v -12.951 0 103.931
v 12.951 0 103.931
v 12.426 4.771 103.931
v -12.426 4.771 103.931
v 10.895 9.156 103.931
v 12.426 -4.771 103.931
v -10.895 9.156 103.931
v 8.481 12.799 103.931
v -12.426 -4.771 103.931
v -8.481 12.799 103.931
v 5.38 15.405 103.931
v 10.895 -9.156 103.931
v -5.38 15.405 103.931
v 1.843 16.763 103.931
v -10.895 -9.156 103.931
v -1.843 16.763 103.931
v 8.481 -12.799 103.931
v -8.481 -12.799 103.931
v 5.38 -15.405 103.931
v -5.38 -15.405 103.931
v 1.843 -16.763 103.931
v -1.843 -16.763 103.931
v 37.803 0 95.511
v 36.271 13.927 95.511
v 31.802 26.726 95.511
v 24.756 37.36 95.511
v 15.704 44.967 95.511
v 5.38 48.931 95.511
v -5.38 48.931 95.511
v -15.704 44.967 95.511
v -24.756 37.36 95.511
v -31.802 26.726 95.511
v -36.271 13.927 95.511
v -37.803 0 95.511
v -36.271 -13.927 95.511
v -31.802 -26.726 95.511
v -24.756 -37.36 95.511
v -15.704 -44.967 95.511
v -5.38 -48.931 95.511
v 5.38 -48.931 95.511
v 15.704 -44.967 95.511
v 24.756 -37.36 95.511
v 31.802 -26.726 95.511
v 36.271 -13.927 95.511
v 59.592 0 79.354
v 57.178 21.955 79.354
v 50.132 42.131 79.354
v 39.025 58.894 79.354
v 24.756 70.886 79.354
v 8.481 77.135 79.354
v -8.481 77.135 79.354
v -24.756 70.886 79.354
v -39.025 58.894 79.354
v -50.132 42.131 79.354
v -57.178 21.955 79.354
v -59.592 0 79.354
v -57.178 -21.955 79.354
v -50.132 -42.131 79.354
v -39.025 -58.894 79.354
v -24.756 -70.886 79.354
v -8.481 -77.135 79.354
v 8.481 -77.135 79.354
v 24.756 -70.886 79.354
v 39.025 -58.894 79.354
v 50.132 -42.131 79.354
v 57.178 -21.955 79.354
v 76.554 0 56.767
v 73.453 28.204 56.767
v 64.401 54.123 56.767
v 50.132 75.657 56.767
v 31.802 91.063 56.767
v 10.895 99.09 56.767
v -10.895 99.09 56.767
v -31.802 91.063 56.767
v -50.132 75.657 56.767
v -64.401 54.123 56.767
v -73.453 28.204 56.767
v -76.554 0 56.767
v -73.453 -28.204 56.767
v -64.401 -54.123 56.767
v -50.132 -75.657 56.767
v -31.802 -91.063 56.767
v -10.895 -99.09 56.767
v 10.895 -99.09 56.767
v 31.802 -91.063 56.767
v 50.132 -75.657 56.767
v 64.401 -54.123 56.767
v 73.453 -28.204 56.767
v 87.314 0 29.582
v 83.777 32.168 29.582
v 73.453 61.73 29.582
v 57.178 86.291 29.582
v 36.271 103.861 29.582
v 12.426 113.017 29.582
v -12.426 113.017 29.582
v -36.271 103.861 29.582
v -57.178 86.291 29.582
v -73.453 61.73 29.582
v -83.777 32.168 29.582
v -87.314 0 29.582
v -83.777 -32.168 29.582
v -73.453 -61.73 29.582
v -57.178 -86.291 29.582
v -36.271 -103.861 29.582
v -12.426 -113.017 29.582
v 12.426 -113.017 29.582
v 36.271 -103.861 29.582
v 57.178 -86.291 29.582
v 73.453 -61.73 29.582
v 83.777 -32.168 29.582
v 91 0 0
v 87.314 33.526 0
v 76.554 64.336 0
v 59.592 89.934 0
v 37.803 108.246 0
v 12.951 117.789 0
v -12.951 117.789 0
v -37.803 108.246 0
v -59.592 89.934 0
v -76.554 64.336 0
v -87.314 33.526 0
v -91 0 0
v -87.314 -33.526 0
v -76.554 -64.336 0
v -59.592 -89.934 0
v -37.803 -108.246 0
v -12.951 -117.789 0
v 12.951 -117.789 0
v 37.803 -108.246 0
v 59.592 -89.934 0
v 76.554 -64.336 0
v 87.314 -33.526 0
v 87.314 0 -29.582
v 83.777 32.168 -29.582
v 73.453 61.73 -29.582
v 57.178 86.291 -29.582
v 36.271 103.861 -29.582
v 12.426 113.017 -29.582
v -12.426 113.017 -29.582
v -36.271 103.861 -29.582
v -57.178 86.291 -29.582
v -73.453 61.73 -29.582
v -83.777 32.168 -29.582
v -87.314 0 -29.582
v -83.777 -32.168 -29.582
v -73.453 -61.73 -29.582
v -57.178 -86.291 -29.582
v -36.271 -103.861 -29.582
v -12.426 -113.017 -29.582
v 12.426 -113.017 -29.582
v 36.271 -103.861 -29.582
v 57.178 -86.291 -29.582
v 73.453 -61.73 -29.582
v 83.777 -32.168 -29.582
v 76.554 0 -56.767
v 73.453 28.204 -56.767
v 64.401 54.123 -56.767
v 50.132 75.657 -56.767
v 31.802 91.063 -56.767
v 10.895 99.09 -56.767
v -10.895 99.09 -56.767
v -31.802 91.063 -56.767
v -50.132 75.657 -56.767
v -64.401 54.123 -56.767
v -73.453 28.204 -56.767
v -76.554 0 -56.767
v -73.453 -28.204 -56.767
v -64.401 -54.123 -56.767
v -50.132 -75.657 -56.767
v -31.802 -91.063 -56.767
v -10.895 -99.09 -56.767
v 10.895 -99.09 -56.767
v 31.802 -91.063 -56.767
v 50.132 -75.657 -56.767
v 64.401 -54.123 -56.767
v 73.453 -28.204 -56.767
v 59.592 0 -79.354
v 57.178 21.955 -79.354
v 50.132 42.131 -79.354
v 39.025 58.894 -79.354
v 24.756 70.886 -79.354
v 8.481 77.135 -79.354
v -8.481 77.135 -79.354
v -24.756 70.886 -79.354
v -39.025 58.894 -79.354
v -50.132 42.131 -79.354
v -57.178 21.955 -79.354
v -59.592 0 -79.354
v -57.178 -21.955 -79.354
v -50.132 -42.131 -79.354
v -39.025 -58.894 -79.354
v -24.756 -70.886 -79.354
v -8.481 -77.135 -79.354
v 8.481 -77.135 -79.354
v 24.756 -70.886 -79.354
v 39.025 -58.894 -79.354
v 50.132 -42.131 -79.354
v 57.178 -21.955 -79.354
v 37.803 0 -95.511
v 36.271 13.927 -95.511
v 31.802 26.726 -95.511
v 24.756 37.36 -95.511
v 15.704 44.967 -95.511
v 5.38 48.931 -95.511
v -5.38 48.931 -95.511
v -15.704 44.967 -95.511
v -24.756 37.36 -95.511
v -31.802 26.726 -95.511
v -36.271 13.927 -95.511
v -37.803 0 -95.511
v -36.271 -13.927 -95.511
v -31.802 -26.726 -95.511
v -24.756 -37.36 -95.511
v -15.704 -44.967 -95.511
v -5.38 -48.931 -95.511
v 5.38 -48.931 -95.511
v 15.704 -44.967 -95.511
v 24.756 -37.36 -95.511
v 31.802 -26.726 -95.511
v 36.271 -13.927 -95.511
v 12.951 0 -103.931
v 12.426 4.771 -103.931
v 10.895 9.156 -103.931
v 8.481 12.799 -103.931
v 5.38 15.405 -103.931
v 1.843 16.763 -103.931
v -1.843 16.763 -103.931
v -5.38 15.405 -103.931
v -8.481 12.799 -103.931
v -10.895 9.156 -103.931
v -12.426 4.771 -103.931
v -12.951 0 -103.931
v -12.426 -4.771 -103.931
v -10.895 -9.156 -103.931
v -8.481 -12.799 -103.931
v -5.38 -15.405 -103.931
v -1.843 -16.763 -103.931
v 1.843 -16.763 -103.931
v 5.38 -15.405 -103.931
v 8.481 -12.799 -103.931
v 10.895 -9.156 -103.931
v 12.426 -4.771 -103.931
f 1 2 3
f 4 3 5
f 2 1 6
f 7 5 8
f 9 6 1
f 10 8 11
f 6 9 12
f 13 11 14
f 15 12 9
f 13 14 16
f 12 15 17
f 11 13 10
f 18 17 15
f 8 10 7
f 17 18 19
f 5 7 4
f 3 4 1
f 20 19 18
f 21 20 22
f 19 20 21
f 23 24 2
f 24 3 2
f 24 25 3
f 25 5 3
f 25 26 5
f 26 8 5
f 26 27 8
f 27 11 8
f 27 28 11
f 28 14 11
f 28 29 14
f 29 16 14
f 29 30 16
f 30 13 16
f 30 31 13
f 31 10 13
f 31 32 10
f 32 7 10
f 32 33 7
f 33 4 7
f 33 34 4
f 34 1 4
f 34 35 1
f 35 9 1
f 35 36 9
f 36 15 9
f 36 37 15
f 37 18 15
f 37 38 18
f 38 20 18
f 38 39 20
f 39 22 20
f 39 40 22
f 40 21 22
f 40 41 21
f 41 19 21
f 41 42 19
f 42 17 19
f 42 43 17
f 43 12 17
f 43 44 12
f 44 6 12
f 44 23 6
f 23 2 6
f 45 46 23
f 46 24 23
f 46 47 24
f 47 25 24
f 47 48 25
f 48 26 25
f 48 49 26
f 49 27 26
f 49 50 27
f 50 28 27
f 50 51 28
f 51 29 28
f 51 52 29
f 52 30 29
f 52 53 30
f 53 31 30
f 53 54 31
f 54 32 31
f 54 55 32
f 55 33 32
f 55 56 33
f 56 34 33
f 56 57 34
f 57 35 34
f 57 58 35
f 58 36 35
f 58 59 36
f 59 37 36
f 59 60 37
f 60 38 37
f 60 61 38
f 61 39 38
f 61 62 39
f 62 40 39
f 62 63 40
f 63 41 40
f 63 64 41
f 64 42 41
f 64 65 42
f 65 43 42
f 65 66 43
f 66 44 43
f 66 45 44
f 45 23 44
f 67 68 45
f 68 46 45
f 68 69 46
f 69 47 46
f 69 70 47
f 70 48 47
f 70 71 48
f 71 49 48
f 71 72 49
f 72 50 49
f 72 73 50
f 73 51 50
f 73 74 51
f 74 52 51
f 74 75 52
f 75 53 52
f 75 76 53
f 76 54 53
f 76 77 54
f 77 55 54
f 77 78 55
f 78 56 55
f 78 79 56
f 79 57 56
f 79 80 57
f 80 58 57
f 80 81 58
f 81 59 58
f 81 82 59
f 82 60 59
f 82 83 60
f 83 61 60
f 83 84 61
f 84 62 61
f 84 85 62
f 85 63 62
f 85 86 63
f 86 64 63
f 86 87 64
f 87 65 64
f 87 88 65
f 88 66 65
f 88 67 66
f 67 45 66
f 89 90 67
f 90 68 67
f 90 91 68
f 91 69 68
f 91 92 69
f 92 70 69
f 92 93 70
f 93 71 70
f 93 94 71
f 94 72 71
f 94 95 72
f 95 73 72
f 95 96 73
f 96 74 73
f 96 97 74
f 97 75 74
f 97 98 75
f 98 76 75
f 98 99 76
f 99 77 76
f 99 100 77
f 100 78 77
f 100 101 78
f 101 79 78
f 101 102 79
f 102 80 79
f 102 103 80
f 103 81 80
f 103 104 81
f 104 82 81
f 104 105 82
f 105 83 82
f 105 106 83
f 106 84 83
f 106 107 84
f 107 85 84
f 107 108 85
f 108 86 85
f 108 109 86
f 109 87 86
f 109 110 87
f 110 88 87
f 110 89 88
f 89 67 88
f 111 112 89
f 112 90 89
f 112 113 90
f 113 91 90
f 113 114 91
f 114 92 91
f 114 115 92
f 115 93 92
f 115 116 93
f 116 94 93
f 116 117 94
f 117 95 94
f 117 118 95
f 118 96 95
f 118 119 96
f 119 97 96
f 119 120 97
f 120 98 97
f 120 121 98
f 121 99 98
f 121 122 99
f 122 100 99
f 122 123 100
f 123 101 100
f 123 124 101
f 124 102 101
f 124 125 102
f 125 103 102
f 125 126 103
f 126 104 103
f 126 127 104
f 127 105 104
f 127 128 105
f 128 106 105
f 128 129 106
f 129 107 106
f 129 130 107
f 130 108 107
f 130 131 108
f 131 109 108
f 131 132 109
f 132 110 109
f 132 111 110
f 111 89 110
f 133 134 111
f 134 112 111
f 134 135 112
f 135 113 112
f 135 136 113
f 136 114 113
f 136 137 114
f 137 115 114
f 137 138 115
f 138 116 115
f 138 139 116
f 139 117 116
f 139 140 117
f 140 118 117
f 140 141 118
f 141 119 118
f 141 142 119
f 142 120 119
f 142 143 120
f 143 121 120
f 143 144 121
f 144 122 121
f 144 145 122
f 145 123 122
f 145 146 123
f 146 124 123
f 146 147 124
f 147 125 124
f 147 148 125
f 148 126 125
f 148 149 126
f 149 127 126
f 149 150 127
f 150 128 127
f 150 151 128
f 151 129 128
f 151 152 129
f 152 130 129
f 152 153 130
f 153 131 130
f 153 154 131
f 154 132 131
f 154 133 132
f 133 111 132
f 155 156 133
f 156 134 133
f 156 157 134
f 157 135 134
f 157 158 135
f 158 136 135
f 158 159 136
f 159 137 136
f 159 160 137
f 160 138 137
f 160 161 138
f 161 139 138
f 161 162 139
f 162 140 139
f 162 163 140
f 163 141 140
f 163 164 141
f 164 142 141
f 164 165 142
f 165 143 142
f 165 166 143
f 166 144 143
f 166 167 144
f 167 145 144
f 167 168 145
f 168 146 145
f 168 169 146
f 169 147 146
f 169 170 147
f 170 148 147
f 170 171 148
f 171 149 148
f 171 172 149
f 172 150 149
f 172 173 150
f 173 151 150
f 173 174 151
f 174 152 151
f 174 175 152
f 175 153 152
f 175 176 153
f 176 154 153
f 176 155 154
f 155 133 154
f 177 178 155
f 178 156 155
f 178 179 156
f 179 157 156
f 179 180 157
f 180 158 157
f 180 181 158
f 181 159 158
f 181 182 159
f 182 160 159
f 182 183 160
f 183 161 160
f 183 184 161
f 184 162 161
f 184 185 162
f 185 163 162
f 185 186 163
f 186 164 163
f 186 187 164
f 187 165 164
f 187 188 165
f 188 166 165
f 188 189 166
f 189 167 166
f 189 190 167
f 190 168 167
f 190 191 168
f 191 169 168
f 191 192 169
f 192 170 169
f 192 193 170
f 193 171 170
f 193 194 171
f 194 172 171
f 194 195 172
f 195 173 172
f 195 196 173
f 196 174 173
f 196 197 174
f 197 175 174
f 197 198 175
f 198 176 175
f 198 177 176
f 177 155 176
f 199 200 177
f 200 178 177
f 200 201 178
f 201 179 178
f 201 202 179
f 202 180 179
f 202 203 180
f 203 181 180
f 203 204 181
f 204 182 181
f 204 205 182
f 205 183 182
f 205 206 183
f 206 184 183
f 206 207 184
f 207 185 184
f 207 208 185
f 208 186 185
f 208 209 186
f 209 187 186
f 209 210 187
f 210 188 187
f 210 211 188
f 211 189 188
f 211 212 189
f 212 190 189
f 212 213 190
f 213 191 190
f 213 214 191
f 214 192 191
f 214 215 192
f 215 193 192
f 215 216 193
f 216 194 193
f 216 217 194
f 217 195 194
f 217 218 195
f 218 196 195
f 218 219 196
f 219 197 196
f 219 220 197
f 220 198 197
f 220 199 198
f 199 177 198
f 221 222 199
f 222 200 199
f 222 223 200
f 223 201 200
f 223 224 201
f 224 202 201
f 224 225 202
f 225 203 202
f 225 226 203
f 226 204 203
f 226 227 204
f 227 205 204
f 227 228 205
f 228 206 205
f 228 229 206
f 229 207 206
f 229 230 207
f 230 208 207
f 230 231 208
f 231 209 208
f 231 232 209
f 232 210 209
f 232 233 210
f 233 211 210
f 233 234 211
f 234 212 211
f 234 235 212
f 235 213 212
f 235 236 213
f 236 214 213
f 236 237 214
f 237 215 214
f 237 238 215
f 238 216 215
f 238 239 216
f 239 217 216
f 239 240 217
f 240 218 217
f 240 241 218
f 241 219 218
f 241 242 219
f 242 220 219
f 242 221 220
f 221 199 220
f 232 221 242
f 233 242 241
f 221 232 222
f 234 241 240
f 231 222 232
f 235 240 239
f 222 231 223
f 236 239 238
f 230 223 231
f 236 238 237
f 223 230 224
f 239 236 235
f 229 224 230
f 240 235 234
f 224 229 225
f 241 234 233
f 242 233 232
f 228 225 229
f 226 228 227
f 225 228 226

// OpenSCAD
// Generated by SolidPython 1.0.1 on 2020-07-29 00:46:51


scale(v = [13, 17, 15]) {
	sphere(r = 7);
}
/***********************************************
*********      SolidPython code:      **********
************************************************
 
# import packages: SolidPython
from solid import *
from solid.utils import *
from itertools import chain, combinations, permutations


class Resize:

    def __init__(self, scad_file):
        self.scad_file = scad_file
        #self.scad_file = import_scad(scad_file)
        # cone/cylinder param:
        self.r1 = 0
        self.r2 = 0
        self.h = 0
        # rectangular prism param:
        self.w = 0
        self.l = 0
        # ellipse param:
        self.r = 0

    # import OpenScad code (file name corresponds to shape)


    # classify shape + parameters
    def assign(self, param1, param2, param3):
        if self.scad_file == 'cone.scad':
            self.r1 = param1
            self.r2 = param2
            self.h = param3
        elif self.scad_file == 'cylinder.scad':
            self.r1 = param1
            self.r2 = param2
            self.h = param3
        elif self.scad_file == 'rectangularPrism.scad':
            self.h = param1
            self.l = param2
            self.w = param3
        else:
            self.r = param1
            self.h = param2

    # resize parameters
    def iterate(self):
        x = range(3, 20, 2)
        i = 1
        if self.scad_file == 'cone.scad':
            tempList = list(permutations(x, 2))
            for temp in tempList:
                param1 = temp[0]
                param2 = temp[1]
                filepath = 'produced_scad_files/' + 'cone' + str(param1) + '_' + str(param2) + '_' + '.scad'
                scad_render_to_file(cylinder(h=param1, r1=param2, r2=0), filepath)

        elif self.scad_file == 'cylinder.scad':
            tempList = list(permutations(x, 3))
            for temp in tempList:
                param1 = temp[0]
                param2 = temp[1]
                filepath = 'produced_scad_files/' + 'cylinder' + str(param1) + '_' + str(param2) + '_' + '.scad'
                scad_render_to_file(cylinder(h=param1, r1=param2, r2=param2), filepath)

        elif self.scad_file == 'rectangularPrism.scad':
            tempList = list(permutations(x, 3))
            for temp in tempList:
                param1 = temp[0]
                param2 = temp[1]
                param3 = temp[2]
                filepath = 'produced_scad_files/' + 'rectangularPrism' + str(param1) + '_' + str(param2) + '_' + str(
                    param3) + '.scad'
                scad_render_to_file(cube(size=(param1, param2, param3)), filepath)

        elif self.scad_file == 'ellipse.scad':
            tempList = list(permutations(x, 4))
            for temp in tempList:
                param1 = temp[0]
                param2 = temp[1]
                param3 = temp[2]
                param4 = temp[3]
                filepath = 'produced_scad_files/' + 'ellipse' + str(param1) + '_' + str(param2) + '_' + str(param3) + '_' + str(param4) + '.scad'
                scad_render_to_file(scale([param1, param2, param3])(sphere(r=param4)), filepath)

    def render_to_scadfile(self):
        scad_render_to_file(scad, 'example.scad') 
 
************************************************/
